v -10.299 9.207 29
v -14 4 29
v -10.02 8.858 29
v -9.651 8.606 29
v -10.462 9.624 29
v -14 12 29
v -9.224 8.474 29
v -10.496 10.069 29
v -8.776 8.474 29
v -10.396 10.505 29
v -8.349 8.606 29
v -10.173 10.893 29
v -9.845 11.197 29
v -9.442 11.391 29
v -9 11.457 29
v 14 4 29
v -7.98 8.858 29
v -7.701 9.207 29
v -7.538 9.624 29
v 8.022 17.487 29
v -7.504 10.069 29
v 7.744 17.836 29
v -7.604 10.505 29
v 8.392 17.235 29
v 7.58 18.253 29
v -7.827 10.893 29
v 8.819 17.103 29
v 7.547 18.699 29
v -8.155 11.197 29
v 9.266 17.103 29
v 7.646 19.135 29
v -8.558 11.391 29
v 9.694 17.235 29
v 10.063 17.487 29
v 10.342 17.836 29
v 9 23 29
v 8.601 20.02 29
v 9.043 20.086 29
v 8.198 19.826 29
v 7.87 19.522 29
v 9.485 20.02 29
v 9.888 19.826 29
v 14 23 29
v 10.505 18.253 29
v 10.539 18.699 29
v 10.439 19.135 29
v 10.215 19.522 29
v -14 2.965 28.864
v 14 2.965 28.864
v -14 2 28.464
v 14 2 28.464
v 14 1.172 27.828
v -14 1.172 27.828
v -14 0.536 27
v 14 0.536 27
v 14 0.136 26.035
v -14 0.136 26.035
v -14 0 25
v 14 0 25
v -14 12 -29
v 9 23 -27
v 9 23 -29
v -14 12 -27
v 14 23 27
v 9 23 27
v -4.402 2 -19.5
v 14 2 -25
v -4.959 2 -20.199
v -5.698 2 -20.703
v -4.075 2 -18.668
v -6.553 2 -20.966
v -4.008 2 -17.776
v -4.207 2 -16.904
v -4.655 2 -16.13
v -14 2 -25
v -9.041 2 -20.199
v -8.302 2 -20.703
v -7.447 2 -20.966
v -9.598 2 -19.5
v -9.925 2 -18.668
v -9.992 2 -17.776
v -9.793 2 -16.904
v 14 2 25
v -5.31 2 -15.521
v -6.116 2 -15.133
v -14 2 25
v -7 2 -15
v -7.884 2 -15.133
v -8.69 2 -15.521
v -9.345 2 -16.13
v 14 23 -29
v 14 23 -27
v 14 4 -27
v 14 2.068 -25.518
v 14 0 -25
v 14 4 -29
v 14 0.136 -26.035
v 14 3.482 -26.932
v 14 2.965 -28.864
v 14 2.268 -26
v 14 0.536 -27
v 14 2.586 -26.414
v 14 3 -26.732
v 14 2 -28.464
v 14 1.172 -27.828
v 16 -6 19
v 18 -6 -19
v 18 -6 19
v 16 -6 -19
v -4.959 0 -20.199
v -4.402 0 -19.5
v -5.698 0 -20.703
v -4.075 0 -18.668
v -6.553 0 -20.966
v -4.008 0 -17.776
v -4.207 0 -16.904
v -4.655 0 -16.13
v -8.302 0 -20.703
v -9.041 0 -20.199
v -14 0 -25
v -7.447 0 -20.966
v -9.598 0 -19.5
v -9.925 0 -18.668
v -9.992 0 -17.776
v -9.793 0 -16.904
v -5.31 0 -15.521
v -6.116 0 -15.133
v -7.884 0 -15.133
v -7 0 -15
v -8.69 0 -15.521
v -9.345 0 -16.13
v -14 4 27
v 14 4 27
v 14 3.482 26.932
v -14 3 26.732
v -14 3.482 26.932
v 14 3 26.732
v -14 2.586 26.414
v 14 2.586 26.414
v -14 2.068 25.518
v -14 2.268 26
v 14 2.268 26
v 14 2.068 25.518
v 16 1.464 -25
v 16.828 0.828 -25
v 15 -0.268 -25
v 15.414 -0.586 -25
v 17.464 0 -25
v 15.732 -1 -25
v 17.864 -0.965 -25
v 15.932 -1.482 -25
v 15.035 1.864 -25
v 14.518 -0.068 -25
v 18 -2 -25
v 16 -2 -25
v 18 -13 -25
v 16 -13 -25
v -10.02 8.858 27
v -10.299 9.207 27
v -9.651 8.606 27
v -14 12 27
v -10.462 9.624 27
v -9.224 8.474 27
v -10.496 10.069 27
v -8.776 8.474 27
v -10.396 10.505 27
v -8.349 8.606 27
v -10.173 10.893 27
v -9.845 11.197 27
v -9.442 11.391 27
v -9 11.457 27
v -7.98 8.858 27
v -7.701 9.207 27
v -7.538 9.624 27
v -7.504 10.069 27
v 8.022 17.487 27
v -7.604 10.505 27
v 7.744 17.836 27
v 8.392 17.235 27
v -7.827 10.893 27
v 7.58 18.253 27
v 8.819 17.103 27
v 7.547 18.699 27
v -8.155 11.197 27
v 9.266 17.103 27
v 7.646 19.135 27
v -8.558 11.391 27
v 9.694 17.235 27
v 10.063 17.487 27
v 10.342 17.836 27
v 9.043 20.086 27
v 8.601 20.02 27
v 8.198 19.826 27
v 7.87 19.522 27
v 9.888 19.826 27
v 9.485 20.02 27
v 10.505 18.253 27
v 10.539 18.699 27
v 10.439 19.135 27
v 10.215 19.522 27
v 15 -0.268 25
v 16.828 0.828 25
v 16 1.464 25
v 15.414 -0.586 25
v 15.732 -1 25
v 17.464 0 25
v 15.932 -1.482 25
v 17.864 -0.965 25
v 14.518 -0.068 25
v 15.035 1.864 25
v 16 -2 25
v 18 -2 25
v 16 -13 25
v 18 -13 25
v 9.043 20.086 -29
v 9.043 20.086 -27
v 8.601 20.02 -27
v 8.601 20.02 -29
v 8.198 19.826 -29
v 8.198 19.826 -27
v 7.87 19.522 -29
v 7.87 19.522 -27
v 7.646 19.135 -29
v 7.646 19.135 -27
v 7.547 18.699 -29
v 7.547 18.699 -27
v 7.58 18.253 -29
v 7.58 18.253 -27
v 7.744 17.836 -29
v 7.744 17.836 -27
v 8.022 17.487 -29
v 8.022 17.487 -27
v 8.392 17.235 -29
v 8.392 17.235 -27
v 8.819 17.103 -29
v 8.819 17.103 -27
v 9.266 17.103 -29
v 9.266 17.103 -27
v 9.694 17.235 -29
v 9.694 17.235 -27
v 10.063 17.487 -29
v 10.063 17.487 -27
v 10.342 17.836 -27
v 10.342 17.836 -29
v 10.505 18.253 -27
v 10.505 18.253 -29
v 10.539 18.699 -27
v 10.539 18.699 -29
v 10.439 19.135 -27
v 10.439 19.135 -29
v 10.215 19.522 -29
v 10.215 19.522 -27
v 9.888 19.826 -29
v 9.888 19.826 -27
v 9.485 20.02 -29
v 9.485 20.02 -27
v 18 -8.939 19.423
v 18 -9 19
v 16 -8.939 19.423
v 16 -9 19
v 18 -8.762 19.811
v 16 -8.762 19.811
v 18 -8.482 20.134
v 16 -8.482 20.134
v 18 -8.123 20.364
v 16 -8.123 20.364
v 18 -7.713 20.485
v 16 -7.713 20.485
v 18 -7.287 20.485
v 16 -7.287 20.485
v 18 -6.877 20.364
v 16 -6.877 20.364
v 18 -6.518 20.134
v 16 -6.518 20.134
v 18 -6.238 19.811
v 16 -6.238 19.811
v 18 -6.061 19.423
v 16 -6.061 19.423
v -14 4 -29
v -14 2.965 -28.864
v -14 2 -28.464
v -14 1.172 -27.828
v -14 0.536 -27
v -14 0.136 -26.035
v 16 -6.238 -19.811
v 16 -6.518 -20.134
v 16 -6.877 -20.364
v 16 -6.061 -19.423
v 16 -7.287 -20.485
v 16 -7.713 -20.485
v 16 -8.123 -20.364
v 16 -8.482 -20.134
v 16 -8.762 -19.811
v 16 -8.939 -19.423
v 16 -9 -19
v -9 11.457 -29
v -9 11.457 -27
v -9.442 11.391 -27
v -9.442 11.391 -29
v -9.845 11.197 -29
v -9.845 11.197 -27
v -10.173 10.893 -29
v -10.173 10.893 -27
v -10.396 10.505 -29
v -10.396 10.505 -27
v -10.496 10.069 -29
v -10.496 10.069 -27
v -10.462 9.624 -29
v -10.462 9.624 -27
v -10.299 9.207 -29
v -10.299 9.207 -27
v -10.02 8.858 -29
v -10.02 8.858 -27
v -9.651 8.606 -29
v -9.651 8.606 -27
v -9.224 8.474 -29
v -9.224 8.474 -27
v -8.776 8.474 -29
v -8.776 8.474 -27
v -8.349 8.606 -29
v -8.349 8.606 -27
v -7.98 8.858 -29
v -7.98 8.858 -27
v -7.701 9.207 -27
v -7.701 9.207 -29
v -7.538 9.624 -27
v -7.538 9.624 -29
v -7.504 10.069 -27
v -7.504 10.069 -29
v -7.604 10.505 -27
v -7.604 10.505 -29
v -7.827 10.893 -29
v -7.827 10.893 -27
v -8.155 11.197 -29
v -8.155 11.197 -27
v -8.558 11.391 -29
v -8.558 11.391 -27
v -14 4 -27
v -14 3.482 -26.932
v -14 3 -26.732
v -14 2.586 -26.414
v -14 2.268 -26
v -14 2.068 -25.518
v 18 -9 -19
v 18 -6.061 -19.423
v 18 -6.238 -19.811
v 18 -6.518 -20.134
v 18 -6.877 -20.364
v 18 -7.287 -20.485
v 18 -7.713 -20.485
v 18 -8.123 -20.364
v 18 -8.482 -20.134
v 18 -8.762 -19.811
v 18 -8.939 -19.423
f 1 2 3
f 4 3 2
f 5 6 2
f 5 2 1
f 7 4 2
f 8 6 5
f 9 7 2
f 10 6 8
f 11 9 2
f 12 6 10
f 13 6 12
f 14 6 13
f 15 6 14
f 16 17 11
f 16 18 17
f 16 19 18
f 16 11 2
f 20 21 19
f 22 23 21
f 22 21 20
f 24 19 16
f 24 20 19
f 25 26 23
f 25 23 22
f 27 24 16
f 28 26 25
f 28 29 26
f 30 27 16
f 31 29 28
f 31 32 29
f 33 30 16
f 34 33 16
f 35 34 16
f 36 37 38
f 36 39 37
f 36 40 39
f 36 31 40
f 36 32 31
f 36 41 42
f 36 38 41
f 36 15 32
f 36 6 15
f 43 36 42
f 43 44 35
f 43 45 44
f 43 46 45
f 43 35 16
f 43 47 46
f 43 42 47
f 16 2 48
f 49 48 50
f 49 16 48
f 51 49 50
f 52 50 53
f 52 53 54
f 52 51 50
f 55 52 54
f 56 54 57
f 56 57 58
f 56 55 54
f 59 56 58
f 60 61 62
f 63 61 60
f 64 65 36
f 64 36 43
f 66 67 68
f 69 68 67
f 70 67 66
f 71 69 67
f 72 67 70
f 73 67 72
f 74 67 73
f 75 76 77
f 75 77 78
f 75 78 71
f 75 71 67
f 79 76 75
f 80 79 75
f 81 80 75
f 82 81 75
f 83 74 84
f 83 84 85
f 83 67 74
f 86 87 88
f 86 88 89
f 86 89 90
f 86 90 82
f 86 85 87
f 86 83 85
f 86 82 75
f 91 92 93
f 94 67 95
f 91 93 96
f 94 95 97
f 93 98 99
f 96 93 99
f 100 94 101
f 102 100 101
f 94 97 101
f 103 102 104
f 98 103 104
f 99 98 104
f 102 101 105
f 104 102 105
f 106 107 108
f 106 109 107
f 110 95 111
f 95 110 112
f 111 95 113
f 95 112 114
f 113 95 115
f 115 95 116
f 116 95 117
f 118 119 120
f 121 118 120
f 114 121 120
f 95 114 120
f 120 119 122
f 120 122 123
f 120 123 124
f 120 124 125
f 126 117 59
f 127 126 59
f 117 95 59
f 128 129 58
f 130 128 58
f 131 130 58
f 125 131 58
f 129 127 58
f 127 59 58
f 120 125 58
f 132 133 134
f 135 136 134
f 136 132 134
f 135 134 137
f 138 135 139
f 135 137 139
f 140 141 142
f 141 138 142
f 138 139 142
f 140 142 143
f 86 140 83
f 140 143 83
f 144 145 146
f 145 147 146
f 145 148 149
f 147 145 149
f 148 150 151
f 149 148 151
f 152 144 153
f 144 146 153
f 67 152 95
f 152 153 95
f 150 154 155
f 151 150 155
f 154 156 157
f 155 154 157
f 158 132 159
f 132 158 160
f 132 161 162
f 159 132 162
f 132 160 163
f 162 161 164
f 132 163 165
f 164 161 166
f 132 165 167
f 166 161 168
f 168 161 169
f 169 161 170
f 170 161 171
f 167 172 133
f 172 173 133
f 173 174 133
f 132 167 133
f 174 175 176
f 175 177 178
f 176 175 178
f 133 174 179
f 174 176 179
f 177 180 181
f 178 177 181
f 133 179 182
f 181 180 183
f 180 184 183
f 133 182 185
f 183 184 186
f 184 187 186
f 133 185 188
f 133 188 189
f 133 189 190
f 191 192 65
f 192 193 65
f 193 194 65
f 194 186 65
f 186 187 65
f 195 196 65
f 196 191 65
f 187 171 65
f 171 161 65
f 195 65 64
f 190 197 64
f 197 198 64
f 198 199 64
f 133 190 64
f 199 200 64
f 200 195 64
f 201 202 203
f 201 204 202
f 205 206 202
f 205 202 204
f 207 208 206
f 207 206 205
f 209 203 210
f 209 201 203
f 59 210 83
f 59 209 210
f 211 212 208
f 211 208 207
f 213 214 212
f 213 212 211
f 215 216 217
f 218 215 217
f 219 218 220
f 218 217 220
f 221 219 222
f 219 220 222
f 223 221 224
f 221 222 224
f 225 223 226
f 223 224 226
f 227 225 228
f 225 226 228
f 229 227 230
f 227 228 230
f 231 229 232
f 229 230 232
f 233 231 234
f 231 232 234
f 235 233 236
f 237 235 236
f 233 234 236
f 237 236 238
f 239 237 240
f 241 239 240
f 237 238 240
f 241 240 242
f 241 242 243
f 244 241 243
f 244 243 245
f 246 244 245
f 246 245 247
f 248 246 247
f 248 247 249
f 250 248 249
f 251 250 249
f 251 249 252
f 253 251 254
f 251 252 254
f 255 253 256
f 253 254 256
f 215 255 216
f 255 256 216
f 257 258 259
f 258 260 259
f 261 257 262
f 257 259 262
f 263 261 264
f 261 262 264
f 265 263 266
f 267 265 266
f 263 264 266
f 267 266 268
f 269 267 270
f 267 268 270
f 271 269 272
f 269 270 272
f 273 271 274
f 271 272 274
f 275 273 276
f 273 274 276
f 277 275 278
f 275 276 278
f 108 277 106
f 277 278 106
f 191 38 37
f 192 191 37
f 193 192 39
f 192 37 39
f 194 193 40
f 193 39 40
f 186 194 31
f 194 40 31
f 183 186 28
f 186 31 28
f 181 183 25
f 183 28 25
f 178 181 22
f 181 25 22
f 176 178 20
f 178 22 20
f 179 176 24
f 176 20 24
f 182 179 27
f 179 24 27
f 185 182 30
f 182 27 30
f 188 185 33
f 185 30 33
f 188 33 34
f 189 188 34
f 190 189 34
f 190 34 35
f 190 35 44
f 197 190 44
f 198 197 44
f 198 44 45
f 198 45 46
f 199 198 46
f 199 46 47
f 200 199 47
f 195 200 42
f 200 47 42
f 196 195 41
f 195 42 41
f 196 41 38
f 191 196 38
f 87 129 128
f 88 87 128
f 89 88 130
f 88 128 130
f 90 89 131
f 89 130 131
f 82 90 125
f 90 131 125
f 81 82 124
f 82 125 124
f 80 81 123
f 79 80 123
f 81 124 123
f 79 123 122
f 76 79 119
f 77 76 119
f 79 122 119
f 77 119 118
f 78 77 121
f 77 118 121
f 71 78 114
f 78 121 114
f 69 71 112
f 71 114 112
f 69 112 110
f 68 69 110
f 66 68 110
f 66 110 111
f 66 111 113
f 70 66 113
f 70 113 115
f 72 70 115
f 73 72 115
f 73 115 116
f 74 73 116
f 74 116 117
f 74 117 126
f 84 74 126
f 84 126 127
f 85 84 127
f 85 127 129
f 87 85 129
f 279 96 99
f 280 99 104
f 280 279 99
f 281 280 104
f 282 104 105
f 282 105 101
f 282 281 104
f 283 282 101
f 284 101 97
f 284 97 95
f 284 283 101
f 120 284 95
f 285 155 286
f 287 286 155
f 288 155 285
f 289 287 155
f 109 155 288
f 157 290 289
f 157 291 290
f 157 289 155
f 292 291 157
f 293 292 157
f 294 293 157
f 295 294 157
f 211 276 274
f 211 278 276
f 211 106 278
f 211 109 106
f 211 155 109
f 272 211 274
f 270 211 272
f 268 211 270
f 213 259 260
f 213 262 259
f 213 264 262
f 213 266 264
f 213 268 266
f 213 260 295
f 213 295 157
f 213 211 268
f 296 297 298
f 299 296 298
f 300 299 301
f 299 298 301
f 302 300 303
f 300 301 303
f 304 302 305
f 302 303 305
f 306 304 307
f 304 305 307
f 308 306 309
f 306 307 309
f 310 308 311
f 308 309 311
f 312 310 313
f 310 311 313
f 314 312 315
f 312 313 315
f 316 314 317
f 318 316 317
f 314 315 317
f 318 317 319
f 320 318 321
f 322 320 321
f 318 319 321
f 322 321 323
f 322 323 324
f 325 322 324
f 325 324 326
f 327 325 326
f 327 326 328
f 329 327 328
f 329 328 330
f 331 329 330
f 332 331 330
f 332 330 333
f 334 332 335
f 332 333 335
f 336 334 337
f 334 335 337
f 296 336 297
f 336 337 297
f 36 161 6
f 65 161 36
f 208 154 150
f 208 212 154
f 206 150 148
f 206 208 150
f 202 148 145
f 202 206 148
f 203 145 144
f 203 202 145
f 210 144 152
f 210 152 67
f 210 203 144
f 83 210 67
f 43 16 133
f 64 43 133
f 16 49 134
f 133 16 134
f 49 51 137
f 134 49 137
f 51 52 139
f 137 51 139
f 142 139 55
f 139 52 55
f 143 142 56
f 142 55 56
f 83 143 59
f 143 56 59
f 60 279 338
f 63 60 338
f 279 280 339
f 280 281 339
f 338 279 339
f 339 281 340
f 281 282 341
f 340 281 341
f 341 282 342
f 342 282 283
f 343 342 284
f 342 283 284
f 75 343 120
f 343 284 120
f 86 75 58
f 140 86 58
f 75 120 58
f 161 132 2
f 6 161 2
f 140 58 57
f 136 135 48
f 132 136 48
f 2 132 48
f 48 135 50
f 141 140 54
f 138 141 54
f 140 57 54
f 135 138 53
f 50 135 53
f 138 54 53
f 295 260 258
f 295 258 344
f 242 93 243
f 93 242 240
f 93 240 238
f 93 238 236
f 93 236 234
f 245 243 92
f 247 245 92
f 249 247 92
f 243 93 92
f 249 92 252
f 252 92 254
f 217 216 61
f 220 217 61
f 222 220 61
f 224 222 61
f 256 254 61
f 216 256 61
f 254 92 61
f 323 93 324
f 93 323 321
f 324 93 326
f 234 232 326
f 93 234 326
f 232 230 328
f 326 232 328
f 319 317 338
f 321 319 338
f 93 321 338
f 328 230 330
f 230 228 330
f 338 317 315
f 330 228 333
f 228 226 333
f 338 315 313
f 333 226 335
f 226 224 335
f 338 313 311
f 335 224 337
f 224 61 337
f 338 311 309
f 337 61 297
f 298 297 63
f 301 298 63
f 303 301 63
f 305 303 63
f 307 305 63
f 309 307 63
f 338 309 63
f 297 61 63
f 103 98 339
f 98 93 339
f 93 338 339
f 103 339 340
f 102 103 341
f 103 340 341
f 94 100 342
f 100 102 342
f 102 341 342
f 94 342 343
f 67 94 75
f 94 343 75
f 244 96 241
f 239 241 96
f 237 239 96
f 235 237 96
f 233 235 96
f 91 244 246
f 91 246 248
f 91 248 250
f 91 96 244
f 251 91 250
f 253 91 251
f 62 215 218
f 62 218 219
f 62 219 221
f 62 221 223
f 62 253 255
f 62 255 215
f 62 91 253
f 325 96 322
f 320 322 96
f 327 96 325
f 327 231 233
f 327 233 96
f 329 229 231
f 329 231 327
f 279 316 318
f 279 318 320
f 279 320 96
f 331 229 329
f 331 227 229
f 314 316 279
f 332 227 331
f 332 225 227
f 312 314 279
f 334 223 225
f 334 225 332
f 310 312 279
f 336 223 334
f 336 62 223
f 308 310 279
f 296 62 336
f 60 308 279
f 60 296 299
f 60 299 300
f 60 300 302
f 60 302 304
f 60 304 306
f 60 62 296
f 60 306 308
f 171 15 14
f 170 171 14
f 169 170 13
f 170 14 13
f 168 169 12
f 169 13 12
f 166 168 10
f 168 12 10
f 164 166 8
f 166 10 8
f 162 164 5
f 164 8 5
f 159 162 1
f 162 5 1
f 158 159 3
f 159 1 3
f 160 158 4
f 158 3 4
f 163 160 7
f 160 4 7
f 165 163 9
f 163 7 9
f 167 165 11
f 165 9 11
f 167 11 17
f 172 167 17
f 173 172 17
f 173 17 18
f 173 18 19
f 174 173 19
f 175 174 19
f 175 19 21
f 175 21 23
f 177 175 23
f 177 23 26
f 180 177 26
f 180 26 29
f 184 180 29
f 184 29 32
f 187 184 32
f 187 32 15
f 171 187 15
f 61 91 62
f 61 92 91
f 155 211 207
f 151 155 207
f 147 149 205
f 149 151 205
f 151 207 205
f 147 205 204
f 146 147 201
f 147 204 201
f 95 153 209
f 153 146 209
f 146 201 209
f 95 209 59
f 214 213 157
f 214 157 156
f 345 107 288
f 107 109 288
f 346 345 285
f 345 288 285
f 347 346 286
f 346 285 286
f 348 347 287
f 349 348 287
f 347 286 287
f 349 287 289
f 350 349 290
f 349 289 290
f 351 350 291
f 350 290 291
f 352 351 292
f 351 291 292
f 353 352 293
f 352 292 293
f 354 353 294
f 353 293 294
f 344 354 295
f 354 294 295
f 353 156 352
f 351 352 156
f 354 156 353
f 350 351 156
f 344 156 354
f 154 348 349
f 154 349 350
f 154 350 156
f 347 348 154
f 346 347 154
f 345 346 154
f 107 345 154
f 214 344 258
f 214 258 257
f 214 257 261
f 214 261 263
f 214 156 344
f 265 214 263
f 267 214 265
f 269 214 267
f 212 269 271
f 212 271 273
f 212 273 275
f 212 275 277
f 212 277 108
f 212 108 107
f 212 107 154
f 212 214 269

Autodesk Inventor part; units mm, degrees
ref_plane "YZ Plane" through (0, 0, 0) normal (1, 0, 0) x (0, 1, 0)
ref_plane "XZ Plane" through (0, 0, 0) normal (0, 1, 0) x (-1, 0, 0)
ref_plane "XY Plane" through (0, 0, 0) normal (0, 0, 1) x (1, 0, 0)
sketch "スケッチ1" plane through (0, 0, 0) normal (0, 1, 0) x (-1, 0, 0)
  line L0 (-14, -27) -> (14, -27)
  line L1 (14, 27) -> (-14, 27)
  line L2 (-14, 27) -> (-14, -27)
  line L3 (-14, -27) -> (14, 27) construction
  line L4 (14, -27) -> (-14, 27) construction
  line L5 (14, -27) -> (14, 27)
  point P0 (0, 0)
  dimension "d0" = 28
  dimension "d1" = 54
extrude "プレート1" add sketch "スケッチ1" along normal blind 2
sketch "スケッチ2" plane through (-14, 0, 27) normal (0, 0, 1) x (1, 0, 0)
  line L0 (0, 2) -> (28, 2)
  line L1 (0, 2) -> (0, 12)
  line L2 (0, 12) -> (23, 23)
  line L3 (23, 23) -> (28, 23)
  line L4 (28, 23) -> (28, 2)
  line L5 (0, 0) -> (0, 2)
  line L6 (28, 2) -> (0, 2)
  point P0 (14, 0)
  dimension "d3" = 10
  dimension "d4" = 5
  dimension "d5" = 21
sheet face with bend "面2" sketch "スケッチ2" thickness 2 toward (0, 0, 1) bend radius 2
bend "曲げ1"
sketch "スケッチ3" plane through (14, 0, -27) normal (0, 0, -1) x (-1, 0, 0)
  line L0 (0, 0) -> (0, 2)
  line L1 (0, 2) -> (0, 23)
  line L2 (0, 23) -> (5, 23)
  line L3 (0, 23) -> (5, 23)
  line L4 (28, 12) -> (28, 4)
  line L5 (5, 23) -> (28, 12)
  line L6 (28, 0) -> (28, 2)
  line L7 (28, 12) -> (28, 2)
  line L8 (28, 2) -> (0, 2)
  point P0 (14, 0)
sheet face with bend "面3" sketch "スケッチ3" thickness 2 toward (0, 0, -1) bend radius 2
bend "曲げ2"
sketch "スケッチ4" plane through (14, 0, -29) normal (0, 0, -1) x (-1, 0, 0)
  line L0 (5, 23) -> (28, 12) projected
  line L1 (0, 23) -> (5, 23) projected
  line L2 (28, 4) -> (28, 12) projected
  point P0 (14, 0)
  point P1 (4.9573, 18.5865)
  point P2 (23, 9.9574)
  dimension "d16" = 4
  dimension "d17" = 4
  dimension "d18" = 20
  dimension "d44" = 5
hole "穴1" at (9.0427, 18.5865, -29) at (-9, 9.9574, -29) direction (0, 0, 1) diameter 3 end through all
sketch "スケッチ6" plane through (16, -2, -25) normal (1, 0, 0) x (0, -1, 0)
  line L0 (0, 50) -> (0, 0)
  line L1 (0, 0) -> (11, 0)
  line L2 (11, 0) -> (11, 50)
  line L3 (11, 50) -> (0, 50)
edge flange "フランジ1" height 15 angle 90 thickness 2 bend radius 2 thickness toward (1, 0, 0) relief straight relief width 2 relief depth 1 edges at (14, 2, 0) wall of the first edge with corners at (16, -2, 25) (16, -2, -25) (16, -13, -25) (16, -13, 25)
bend "曲げ3"
corner "コーナー1"
sketch "スケッチ8" plane through (16, -13, -25) normal (-1, 0, 0) x (0, 0, 1)
  line L0 (44, 4) -> (6, 4)
  arc A0 (6, 7) -> (6, 4) centre (6, 5.5) ccw
  line L1 (6, 7) -> (44, 7)
  arc A1 (44, 4) -> (44, 7) centre (44, 5.5) ccw
  line L2 (50, 11) -> (50, 0) projected
  line L3 (0, 0) -> (0, 11) projected
  line L4 (50, 0) -> (0, 0) projected
  point P0 (25, 13)
  point P1 (50, 5.5)
  dimension "d66" = 6
  dimension "d67" = 6
  dimension "d69" = 1.5
extrude "押し出し2" cut sketch "スケッチ8" against normal blind 10
sketch "スケッチ9" plane through (0, 2, 0) normal (0, 1, 0) x (1, 0, 0)
  line L0 (14, 25) -> (-14, 25) projected
  line L1 (-14, -25) -> (-14, 25) projected
  point P0 (0, 0)
  point P1 (-7, 18)
  dimension "d72" = 7
  dimension "d73" = 7
hole "穴3" at (-7, 2, -18) direction (0, -1, 0) diameter 6 end through all
equation "\"d25\" = Thickness"
equation "\"d79\" = Thickness"
equation "\"d2\" = Thickness"
equation "\"d6\" = BendRadius"
equation "\"d7\" = BendReliefWidth"
equation "\"d9\" = MinimumRemnant"
equation "\"d8\" = BendReliefDepth"
equation "\"d10\" = TransitionRadius"
equation "\"d11\" = BendRadius"
equation "\"d12\" = BendReliefWidth"
equation "\"d14\" = MinimumRemnant"
equation "\"d13\" = BendReliefDepth"
equation "\"d15\" = TransitionRadius"
equation "\"d45\" = BendReliefWidth"
equation "\"d46\" = BendReliefDepth"
equation "\"d47\" = MinimumRemnant"
equation "\"d48\" = TransitionRadius"
equation "\"d51\" = BendRadius"
equation "\"d52\" = CornerReliefSize"
equation "\"d53\" = GapSize"
equation "\"d54\" = JacobiRadiusSize"
equation "\"BendRadius\" = Thickness"
equation "\"BendReliefWidth\" = Thickness"
equation "\"BendReliefDepth\" = 0.5 * Thickness"
equation "\"CornerReliefSize\" = 4 * Thickness"
equation "\"MinimumRemnant\" = 2 * Thickness"
equation "\"TransitionRadius\" = BendRadius"
equation "\"JacobiRadiusSize\" = Thickness"
equation "\"GapSize\" = Thickness"
equation "\"Thickness\" = 2"
properties part number "trackball_l" material "アルミニウム 6061"
